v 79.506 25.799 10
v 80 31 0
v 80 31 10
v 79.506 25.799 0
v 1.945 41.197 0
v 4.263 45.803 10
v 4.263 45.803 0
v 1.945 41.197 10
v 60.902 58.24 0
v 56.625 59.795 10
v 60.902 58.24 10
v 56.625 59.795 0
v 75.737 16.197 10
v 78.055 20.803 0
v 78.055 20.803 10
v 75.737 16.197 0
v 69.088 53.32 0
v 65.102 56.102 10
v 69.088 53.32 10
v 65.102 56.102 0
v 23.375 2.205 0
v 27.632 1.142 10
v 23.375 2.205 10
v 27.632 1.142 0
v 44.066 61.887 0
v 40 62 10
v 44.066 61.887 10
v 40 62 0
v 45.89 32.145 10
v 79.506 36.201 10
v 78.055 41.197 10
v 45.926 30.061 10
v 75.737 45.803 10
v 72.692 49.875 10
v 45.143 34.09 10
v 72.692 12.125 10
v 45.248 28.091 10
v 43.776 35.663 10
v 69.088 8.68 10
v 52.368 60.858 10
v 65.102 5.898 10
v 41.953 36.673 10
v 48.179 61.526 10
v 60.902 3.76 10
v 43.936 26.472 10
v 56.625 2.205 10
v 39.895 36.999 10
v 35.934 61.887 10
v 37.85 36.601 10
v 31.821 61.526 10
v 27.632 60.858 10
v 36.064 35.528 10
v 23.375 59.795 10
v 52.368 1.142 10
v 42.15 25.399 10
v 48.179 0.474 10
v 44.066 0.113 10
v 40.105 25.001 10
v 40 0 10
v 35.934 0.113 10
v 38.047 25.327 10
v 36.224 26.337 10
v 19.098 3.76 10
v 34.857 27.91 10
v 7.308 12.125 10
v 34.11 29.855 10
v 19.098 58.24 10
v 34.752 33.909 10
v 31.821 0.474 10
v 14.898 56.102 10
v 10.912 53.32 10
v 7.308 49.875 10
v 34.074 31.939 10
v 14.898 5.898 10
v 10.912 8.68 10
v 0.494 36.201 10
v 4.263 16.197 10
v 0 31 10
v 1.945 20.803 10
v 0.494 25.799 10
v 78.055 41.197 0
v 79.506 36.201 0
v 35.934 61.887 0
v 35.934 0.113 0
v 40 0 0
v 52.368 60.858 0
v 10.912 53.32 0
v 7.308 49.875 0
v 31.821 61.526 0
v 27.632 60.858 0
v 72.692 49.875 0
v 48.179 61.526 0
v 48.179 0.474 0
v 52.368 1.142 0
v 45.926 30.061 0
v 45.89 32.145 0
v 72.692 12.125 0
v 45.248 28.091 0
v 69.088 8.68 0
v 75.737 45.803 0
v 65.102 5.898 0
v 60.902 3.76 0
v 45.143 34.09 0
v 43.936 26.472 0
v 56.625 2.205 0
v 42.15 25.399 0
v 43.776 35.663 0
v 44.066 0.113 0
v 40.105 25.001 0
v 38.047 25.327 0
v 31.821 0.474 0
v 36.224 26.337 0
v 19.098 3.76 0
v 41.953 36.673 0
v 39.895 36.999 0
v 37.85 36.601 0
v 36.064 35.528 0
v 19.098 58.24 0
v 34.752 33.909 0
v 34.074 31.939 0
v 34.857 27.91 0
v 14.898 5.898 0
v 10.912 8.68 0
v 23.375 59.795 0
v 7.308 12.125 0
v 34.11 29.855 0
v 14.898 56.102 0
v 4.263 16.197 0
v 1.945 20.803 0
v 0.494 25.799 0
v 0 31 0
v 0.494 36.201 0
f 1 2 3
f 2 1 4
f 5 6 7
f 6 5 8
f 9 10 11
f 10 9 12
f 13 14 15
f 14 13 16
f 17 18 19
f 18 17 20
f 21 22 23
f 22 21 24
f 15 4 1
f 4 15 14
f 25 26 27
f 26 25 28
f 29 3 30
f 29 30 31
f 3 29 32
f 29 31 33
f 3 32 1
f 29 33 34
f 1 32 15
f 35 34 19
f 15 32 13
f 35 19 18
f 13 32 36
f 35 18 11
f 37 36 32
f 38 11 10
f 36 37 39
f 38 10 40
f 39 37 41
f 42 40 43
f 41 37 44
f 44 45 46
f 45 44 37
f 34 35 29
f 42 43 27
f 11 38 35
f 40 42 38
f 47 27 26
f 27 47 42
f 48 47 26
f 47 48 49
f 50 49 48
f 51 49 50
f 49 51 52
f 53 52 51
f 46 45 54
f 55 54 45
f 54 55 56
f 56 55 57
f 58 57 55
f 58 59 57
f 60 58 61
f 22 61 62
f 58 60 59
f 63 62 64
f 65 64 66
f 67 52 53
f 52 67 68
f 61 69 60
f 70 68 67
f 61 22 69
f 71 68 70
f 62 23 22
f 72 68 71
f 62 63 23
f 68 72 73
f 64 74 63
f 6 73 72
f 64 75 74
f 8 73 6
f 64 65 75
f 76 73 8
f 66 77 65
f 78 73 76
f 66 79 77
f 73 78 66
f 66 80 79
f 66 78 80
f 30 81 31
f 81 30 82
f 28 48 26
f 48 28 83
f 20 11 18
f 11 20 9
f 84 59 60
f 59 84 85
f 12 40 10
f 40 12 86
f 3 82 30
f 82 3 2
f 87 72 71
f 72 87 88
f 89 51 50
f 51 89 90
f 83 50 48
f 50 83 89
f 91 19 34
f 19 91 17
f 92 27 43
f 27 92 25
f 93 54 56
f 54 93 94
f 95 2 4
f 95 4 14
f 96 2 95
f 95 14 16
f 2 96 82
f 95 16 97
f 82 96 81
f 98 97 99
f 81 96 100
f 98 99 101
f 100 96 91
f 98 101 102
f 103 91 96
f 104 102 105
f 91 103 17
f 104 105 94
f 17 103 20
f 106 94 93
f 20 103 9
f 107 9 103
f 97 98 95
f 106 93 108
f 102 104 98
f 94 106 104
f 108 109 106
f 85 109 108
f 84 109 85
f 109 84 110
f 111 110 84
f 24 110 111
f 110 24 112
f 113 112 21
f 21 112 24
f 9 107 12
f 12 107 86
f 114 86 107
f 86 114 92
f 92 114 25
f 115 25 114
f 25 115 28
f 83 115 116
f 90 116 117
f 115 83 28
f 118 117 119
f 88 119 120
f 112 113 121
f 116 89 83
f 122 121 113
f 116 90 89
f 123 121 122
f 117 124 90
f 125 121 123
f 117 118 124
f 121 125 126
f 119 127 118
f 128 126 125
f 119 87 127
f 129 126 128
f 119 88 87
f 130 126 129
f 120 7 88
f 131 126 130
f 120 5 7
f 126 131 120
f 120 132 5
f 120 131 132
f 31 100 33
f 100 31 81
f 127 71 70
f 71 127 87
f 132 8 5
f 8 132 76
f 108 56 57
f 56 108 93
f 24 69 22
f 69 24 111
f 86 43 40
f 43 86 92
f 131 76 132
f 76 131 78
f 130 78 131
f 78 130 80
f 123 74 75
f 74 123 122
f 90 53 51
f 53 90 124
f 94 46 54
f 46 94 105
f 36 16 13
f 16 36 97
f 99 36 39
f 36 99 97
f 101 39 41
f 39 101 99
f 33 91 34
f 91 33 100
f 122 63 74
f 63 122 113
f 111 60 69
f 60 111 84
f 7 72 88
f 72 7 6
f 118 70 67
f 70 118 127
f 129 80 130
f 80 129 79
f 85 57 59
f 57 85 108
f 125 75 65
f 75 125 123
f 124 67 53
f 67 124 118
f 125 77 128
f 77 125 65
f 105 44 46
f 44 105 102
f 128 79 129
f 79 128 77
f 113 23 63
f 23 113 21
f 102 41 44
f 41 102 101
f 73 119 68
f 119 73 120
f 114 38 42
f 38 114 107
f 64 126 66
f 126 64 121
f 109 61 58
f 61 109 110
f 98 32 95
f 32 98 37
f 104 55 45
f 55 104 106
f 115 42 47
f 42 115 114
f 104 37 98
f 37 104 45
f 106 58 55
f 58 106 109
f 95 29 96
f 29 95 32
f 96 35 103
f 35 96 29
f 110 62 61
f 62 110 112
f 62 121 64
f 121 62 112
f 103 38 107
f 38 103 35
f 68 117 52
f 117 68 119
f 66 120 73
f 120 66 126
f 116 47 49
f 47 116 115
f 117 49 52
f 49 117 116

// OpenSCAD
$fn = 32;

// ----------------------------------------------------------------------
// Cam plate: double_lobe cam, base R28
// ----------------------------------------------------------------------

// --- parameters (mm) ---
base_r = 28;              // base circle radius
lobe_h = 12;              // cam lobe rise
bore_r = 6;               // shaft bore radius
plate_t = 10;             // plate thickness, Z (extrusion height)
fit_tol = 0.1;            // declared fit tolerance (prompt contract)
free_tol = 0.5;           // declared free tolerance (prompt contract)

profile = [[80, 31], [79.506, 36.201], [78.055, 41.197], [75.737, 45.803], [72.692, 49.875], [69.088, 53.32], [65.102, 56.102], [60.902, 58.24], [56.625, 59.795], [52.368, 60.858], [48.179, 61.526], [44.066, 61.887], [40, 62], [35.934, 61.887], [31.821, 61.526], [27.632, 60.858], [23.375, 59.795], [19.098, 58.24], [14.898, 56.102], [10.912, 53.32], [7.308, 49.875], [4.263, 45.803], [1.945, 41.197], [0.494, 36.201], [0, 31], [0.494, 25.799], [1.945, 20.803], [4.263, 16.197], [7.308, 12.125], [10.912, 8.68], [14.898, 5.898], [19.098, 3.76], [23.375, 2.205], [27.632, 1.142], [31.821, 0.474], [35.934, 0.113], [40, 0], [44.066, 0.113], [48.179, 0.474], [52.368, 1.142], [56.625, 2.205], [60.902, 3.76], [65.102, 5.898], [69.088, 8.68], [72.692, 12.125], [75.737, 16.197], [78.055, 20.803], [79.506, 25.799]];  // primary outline, 48 points, counter clockwise
void_1 = [[45.89, 32.145], [45.143, 34.09], [43.776, 35.663], [41.953, 36.673], [39.895, 36.999], [37.85, 36.601], [36.064, 35.528], [34.752, 33.909], [34.074, 31.939], [34.11, 29.855], [34.857, 27.91], [36.224, 26.337], [38.047, 25.327], [40.105, 25.001], [42.15, 25.399], [43.936, 26.472], [45.248, 28.091], [45.926, 30.061]];  // shaft bore, 18 points

// --- the one profile operation ---
difference() {
  linear_extrude(height = plate_t) polygon(points = profile);
  translate([0, 0, -1])
    linear_extrude(height = plate_t + 2) polygon(points = void_1);
}
